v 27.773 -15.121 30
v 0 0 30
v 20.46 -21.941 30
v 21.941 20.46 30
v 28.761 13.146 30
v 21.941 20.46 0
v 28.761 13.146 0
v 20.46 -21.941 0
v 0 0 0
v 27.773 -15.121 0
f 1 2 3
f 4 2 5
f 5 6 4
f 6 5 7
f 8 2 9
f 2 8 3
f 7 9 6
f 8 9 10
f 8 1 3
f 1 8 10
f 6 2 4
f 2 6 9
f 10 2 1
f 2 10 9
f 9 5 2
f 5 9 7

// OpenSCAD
rotate([0,0,-92])
rotate([0,-90,0]){
    difference(){
        rotate([-45,0,0]) {
            cube([30, 30, 30]);
        }
        scale([1,2,1]) {
            rotate([-45,0,0]) {
                cube([30, 30, 30]);
            }
        }
    }
}
